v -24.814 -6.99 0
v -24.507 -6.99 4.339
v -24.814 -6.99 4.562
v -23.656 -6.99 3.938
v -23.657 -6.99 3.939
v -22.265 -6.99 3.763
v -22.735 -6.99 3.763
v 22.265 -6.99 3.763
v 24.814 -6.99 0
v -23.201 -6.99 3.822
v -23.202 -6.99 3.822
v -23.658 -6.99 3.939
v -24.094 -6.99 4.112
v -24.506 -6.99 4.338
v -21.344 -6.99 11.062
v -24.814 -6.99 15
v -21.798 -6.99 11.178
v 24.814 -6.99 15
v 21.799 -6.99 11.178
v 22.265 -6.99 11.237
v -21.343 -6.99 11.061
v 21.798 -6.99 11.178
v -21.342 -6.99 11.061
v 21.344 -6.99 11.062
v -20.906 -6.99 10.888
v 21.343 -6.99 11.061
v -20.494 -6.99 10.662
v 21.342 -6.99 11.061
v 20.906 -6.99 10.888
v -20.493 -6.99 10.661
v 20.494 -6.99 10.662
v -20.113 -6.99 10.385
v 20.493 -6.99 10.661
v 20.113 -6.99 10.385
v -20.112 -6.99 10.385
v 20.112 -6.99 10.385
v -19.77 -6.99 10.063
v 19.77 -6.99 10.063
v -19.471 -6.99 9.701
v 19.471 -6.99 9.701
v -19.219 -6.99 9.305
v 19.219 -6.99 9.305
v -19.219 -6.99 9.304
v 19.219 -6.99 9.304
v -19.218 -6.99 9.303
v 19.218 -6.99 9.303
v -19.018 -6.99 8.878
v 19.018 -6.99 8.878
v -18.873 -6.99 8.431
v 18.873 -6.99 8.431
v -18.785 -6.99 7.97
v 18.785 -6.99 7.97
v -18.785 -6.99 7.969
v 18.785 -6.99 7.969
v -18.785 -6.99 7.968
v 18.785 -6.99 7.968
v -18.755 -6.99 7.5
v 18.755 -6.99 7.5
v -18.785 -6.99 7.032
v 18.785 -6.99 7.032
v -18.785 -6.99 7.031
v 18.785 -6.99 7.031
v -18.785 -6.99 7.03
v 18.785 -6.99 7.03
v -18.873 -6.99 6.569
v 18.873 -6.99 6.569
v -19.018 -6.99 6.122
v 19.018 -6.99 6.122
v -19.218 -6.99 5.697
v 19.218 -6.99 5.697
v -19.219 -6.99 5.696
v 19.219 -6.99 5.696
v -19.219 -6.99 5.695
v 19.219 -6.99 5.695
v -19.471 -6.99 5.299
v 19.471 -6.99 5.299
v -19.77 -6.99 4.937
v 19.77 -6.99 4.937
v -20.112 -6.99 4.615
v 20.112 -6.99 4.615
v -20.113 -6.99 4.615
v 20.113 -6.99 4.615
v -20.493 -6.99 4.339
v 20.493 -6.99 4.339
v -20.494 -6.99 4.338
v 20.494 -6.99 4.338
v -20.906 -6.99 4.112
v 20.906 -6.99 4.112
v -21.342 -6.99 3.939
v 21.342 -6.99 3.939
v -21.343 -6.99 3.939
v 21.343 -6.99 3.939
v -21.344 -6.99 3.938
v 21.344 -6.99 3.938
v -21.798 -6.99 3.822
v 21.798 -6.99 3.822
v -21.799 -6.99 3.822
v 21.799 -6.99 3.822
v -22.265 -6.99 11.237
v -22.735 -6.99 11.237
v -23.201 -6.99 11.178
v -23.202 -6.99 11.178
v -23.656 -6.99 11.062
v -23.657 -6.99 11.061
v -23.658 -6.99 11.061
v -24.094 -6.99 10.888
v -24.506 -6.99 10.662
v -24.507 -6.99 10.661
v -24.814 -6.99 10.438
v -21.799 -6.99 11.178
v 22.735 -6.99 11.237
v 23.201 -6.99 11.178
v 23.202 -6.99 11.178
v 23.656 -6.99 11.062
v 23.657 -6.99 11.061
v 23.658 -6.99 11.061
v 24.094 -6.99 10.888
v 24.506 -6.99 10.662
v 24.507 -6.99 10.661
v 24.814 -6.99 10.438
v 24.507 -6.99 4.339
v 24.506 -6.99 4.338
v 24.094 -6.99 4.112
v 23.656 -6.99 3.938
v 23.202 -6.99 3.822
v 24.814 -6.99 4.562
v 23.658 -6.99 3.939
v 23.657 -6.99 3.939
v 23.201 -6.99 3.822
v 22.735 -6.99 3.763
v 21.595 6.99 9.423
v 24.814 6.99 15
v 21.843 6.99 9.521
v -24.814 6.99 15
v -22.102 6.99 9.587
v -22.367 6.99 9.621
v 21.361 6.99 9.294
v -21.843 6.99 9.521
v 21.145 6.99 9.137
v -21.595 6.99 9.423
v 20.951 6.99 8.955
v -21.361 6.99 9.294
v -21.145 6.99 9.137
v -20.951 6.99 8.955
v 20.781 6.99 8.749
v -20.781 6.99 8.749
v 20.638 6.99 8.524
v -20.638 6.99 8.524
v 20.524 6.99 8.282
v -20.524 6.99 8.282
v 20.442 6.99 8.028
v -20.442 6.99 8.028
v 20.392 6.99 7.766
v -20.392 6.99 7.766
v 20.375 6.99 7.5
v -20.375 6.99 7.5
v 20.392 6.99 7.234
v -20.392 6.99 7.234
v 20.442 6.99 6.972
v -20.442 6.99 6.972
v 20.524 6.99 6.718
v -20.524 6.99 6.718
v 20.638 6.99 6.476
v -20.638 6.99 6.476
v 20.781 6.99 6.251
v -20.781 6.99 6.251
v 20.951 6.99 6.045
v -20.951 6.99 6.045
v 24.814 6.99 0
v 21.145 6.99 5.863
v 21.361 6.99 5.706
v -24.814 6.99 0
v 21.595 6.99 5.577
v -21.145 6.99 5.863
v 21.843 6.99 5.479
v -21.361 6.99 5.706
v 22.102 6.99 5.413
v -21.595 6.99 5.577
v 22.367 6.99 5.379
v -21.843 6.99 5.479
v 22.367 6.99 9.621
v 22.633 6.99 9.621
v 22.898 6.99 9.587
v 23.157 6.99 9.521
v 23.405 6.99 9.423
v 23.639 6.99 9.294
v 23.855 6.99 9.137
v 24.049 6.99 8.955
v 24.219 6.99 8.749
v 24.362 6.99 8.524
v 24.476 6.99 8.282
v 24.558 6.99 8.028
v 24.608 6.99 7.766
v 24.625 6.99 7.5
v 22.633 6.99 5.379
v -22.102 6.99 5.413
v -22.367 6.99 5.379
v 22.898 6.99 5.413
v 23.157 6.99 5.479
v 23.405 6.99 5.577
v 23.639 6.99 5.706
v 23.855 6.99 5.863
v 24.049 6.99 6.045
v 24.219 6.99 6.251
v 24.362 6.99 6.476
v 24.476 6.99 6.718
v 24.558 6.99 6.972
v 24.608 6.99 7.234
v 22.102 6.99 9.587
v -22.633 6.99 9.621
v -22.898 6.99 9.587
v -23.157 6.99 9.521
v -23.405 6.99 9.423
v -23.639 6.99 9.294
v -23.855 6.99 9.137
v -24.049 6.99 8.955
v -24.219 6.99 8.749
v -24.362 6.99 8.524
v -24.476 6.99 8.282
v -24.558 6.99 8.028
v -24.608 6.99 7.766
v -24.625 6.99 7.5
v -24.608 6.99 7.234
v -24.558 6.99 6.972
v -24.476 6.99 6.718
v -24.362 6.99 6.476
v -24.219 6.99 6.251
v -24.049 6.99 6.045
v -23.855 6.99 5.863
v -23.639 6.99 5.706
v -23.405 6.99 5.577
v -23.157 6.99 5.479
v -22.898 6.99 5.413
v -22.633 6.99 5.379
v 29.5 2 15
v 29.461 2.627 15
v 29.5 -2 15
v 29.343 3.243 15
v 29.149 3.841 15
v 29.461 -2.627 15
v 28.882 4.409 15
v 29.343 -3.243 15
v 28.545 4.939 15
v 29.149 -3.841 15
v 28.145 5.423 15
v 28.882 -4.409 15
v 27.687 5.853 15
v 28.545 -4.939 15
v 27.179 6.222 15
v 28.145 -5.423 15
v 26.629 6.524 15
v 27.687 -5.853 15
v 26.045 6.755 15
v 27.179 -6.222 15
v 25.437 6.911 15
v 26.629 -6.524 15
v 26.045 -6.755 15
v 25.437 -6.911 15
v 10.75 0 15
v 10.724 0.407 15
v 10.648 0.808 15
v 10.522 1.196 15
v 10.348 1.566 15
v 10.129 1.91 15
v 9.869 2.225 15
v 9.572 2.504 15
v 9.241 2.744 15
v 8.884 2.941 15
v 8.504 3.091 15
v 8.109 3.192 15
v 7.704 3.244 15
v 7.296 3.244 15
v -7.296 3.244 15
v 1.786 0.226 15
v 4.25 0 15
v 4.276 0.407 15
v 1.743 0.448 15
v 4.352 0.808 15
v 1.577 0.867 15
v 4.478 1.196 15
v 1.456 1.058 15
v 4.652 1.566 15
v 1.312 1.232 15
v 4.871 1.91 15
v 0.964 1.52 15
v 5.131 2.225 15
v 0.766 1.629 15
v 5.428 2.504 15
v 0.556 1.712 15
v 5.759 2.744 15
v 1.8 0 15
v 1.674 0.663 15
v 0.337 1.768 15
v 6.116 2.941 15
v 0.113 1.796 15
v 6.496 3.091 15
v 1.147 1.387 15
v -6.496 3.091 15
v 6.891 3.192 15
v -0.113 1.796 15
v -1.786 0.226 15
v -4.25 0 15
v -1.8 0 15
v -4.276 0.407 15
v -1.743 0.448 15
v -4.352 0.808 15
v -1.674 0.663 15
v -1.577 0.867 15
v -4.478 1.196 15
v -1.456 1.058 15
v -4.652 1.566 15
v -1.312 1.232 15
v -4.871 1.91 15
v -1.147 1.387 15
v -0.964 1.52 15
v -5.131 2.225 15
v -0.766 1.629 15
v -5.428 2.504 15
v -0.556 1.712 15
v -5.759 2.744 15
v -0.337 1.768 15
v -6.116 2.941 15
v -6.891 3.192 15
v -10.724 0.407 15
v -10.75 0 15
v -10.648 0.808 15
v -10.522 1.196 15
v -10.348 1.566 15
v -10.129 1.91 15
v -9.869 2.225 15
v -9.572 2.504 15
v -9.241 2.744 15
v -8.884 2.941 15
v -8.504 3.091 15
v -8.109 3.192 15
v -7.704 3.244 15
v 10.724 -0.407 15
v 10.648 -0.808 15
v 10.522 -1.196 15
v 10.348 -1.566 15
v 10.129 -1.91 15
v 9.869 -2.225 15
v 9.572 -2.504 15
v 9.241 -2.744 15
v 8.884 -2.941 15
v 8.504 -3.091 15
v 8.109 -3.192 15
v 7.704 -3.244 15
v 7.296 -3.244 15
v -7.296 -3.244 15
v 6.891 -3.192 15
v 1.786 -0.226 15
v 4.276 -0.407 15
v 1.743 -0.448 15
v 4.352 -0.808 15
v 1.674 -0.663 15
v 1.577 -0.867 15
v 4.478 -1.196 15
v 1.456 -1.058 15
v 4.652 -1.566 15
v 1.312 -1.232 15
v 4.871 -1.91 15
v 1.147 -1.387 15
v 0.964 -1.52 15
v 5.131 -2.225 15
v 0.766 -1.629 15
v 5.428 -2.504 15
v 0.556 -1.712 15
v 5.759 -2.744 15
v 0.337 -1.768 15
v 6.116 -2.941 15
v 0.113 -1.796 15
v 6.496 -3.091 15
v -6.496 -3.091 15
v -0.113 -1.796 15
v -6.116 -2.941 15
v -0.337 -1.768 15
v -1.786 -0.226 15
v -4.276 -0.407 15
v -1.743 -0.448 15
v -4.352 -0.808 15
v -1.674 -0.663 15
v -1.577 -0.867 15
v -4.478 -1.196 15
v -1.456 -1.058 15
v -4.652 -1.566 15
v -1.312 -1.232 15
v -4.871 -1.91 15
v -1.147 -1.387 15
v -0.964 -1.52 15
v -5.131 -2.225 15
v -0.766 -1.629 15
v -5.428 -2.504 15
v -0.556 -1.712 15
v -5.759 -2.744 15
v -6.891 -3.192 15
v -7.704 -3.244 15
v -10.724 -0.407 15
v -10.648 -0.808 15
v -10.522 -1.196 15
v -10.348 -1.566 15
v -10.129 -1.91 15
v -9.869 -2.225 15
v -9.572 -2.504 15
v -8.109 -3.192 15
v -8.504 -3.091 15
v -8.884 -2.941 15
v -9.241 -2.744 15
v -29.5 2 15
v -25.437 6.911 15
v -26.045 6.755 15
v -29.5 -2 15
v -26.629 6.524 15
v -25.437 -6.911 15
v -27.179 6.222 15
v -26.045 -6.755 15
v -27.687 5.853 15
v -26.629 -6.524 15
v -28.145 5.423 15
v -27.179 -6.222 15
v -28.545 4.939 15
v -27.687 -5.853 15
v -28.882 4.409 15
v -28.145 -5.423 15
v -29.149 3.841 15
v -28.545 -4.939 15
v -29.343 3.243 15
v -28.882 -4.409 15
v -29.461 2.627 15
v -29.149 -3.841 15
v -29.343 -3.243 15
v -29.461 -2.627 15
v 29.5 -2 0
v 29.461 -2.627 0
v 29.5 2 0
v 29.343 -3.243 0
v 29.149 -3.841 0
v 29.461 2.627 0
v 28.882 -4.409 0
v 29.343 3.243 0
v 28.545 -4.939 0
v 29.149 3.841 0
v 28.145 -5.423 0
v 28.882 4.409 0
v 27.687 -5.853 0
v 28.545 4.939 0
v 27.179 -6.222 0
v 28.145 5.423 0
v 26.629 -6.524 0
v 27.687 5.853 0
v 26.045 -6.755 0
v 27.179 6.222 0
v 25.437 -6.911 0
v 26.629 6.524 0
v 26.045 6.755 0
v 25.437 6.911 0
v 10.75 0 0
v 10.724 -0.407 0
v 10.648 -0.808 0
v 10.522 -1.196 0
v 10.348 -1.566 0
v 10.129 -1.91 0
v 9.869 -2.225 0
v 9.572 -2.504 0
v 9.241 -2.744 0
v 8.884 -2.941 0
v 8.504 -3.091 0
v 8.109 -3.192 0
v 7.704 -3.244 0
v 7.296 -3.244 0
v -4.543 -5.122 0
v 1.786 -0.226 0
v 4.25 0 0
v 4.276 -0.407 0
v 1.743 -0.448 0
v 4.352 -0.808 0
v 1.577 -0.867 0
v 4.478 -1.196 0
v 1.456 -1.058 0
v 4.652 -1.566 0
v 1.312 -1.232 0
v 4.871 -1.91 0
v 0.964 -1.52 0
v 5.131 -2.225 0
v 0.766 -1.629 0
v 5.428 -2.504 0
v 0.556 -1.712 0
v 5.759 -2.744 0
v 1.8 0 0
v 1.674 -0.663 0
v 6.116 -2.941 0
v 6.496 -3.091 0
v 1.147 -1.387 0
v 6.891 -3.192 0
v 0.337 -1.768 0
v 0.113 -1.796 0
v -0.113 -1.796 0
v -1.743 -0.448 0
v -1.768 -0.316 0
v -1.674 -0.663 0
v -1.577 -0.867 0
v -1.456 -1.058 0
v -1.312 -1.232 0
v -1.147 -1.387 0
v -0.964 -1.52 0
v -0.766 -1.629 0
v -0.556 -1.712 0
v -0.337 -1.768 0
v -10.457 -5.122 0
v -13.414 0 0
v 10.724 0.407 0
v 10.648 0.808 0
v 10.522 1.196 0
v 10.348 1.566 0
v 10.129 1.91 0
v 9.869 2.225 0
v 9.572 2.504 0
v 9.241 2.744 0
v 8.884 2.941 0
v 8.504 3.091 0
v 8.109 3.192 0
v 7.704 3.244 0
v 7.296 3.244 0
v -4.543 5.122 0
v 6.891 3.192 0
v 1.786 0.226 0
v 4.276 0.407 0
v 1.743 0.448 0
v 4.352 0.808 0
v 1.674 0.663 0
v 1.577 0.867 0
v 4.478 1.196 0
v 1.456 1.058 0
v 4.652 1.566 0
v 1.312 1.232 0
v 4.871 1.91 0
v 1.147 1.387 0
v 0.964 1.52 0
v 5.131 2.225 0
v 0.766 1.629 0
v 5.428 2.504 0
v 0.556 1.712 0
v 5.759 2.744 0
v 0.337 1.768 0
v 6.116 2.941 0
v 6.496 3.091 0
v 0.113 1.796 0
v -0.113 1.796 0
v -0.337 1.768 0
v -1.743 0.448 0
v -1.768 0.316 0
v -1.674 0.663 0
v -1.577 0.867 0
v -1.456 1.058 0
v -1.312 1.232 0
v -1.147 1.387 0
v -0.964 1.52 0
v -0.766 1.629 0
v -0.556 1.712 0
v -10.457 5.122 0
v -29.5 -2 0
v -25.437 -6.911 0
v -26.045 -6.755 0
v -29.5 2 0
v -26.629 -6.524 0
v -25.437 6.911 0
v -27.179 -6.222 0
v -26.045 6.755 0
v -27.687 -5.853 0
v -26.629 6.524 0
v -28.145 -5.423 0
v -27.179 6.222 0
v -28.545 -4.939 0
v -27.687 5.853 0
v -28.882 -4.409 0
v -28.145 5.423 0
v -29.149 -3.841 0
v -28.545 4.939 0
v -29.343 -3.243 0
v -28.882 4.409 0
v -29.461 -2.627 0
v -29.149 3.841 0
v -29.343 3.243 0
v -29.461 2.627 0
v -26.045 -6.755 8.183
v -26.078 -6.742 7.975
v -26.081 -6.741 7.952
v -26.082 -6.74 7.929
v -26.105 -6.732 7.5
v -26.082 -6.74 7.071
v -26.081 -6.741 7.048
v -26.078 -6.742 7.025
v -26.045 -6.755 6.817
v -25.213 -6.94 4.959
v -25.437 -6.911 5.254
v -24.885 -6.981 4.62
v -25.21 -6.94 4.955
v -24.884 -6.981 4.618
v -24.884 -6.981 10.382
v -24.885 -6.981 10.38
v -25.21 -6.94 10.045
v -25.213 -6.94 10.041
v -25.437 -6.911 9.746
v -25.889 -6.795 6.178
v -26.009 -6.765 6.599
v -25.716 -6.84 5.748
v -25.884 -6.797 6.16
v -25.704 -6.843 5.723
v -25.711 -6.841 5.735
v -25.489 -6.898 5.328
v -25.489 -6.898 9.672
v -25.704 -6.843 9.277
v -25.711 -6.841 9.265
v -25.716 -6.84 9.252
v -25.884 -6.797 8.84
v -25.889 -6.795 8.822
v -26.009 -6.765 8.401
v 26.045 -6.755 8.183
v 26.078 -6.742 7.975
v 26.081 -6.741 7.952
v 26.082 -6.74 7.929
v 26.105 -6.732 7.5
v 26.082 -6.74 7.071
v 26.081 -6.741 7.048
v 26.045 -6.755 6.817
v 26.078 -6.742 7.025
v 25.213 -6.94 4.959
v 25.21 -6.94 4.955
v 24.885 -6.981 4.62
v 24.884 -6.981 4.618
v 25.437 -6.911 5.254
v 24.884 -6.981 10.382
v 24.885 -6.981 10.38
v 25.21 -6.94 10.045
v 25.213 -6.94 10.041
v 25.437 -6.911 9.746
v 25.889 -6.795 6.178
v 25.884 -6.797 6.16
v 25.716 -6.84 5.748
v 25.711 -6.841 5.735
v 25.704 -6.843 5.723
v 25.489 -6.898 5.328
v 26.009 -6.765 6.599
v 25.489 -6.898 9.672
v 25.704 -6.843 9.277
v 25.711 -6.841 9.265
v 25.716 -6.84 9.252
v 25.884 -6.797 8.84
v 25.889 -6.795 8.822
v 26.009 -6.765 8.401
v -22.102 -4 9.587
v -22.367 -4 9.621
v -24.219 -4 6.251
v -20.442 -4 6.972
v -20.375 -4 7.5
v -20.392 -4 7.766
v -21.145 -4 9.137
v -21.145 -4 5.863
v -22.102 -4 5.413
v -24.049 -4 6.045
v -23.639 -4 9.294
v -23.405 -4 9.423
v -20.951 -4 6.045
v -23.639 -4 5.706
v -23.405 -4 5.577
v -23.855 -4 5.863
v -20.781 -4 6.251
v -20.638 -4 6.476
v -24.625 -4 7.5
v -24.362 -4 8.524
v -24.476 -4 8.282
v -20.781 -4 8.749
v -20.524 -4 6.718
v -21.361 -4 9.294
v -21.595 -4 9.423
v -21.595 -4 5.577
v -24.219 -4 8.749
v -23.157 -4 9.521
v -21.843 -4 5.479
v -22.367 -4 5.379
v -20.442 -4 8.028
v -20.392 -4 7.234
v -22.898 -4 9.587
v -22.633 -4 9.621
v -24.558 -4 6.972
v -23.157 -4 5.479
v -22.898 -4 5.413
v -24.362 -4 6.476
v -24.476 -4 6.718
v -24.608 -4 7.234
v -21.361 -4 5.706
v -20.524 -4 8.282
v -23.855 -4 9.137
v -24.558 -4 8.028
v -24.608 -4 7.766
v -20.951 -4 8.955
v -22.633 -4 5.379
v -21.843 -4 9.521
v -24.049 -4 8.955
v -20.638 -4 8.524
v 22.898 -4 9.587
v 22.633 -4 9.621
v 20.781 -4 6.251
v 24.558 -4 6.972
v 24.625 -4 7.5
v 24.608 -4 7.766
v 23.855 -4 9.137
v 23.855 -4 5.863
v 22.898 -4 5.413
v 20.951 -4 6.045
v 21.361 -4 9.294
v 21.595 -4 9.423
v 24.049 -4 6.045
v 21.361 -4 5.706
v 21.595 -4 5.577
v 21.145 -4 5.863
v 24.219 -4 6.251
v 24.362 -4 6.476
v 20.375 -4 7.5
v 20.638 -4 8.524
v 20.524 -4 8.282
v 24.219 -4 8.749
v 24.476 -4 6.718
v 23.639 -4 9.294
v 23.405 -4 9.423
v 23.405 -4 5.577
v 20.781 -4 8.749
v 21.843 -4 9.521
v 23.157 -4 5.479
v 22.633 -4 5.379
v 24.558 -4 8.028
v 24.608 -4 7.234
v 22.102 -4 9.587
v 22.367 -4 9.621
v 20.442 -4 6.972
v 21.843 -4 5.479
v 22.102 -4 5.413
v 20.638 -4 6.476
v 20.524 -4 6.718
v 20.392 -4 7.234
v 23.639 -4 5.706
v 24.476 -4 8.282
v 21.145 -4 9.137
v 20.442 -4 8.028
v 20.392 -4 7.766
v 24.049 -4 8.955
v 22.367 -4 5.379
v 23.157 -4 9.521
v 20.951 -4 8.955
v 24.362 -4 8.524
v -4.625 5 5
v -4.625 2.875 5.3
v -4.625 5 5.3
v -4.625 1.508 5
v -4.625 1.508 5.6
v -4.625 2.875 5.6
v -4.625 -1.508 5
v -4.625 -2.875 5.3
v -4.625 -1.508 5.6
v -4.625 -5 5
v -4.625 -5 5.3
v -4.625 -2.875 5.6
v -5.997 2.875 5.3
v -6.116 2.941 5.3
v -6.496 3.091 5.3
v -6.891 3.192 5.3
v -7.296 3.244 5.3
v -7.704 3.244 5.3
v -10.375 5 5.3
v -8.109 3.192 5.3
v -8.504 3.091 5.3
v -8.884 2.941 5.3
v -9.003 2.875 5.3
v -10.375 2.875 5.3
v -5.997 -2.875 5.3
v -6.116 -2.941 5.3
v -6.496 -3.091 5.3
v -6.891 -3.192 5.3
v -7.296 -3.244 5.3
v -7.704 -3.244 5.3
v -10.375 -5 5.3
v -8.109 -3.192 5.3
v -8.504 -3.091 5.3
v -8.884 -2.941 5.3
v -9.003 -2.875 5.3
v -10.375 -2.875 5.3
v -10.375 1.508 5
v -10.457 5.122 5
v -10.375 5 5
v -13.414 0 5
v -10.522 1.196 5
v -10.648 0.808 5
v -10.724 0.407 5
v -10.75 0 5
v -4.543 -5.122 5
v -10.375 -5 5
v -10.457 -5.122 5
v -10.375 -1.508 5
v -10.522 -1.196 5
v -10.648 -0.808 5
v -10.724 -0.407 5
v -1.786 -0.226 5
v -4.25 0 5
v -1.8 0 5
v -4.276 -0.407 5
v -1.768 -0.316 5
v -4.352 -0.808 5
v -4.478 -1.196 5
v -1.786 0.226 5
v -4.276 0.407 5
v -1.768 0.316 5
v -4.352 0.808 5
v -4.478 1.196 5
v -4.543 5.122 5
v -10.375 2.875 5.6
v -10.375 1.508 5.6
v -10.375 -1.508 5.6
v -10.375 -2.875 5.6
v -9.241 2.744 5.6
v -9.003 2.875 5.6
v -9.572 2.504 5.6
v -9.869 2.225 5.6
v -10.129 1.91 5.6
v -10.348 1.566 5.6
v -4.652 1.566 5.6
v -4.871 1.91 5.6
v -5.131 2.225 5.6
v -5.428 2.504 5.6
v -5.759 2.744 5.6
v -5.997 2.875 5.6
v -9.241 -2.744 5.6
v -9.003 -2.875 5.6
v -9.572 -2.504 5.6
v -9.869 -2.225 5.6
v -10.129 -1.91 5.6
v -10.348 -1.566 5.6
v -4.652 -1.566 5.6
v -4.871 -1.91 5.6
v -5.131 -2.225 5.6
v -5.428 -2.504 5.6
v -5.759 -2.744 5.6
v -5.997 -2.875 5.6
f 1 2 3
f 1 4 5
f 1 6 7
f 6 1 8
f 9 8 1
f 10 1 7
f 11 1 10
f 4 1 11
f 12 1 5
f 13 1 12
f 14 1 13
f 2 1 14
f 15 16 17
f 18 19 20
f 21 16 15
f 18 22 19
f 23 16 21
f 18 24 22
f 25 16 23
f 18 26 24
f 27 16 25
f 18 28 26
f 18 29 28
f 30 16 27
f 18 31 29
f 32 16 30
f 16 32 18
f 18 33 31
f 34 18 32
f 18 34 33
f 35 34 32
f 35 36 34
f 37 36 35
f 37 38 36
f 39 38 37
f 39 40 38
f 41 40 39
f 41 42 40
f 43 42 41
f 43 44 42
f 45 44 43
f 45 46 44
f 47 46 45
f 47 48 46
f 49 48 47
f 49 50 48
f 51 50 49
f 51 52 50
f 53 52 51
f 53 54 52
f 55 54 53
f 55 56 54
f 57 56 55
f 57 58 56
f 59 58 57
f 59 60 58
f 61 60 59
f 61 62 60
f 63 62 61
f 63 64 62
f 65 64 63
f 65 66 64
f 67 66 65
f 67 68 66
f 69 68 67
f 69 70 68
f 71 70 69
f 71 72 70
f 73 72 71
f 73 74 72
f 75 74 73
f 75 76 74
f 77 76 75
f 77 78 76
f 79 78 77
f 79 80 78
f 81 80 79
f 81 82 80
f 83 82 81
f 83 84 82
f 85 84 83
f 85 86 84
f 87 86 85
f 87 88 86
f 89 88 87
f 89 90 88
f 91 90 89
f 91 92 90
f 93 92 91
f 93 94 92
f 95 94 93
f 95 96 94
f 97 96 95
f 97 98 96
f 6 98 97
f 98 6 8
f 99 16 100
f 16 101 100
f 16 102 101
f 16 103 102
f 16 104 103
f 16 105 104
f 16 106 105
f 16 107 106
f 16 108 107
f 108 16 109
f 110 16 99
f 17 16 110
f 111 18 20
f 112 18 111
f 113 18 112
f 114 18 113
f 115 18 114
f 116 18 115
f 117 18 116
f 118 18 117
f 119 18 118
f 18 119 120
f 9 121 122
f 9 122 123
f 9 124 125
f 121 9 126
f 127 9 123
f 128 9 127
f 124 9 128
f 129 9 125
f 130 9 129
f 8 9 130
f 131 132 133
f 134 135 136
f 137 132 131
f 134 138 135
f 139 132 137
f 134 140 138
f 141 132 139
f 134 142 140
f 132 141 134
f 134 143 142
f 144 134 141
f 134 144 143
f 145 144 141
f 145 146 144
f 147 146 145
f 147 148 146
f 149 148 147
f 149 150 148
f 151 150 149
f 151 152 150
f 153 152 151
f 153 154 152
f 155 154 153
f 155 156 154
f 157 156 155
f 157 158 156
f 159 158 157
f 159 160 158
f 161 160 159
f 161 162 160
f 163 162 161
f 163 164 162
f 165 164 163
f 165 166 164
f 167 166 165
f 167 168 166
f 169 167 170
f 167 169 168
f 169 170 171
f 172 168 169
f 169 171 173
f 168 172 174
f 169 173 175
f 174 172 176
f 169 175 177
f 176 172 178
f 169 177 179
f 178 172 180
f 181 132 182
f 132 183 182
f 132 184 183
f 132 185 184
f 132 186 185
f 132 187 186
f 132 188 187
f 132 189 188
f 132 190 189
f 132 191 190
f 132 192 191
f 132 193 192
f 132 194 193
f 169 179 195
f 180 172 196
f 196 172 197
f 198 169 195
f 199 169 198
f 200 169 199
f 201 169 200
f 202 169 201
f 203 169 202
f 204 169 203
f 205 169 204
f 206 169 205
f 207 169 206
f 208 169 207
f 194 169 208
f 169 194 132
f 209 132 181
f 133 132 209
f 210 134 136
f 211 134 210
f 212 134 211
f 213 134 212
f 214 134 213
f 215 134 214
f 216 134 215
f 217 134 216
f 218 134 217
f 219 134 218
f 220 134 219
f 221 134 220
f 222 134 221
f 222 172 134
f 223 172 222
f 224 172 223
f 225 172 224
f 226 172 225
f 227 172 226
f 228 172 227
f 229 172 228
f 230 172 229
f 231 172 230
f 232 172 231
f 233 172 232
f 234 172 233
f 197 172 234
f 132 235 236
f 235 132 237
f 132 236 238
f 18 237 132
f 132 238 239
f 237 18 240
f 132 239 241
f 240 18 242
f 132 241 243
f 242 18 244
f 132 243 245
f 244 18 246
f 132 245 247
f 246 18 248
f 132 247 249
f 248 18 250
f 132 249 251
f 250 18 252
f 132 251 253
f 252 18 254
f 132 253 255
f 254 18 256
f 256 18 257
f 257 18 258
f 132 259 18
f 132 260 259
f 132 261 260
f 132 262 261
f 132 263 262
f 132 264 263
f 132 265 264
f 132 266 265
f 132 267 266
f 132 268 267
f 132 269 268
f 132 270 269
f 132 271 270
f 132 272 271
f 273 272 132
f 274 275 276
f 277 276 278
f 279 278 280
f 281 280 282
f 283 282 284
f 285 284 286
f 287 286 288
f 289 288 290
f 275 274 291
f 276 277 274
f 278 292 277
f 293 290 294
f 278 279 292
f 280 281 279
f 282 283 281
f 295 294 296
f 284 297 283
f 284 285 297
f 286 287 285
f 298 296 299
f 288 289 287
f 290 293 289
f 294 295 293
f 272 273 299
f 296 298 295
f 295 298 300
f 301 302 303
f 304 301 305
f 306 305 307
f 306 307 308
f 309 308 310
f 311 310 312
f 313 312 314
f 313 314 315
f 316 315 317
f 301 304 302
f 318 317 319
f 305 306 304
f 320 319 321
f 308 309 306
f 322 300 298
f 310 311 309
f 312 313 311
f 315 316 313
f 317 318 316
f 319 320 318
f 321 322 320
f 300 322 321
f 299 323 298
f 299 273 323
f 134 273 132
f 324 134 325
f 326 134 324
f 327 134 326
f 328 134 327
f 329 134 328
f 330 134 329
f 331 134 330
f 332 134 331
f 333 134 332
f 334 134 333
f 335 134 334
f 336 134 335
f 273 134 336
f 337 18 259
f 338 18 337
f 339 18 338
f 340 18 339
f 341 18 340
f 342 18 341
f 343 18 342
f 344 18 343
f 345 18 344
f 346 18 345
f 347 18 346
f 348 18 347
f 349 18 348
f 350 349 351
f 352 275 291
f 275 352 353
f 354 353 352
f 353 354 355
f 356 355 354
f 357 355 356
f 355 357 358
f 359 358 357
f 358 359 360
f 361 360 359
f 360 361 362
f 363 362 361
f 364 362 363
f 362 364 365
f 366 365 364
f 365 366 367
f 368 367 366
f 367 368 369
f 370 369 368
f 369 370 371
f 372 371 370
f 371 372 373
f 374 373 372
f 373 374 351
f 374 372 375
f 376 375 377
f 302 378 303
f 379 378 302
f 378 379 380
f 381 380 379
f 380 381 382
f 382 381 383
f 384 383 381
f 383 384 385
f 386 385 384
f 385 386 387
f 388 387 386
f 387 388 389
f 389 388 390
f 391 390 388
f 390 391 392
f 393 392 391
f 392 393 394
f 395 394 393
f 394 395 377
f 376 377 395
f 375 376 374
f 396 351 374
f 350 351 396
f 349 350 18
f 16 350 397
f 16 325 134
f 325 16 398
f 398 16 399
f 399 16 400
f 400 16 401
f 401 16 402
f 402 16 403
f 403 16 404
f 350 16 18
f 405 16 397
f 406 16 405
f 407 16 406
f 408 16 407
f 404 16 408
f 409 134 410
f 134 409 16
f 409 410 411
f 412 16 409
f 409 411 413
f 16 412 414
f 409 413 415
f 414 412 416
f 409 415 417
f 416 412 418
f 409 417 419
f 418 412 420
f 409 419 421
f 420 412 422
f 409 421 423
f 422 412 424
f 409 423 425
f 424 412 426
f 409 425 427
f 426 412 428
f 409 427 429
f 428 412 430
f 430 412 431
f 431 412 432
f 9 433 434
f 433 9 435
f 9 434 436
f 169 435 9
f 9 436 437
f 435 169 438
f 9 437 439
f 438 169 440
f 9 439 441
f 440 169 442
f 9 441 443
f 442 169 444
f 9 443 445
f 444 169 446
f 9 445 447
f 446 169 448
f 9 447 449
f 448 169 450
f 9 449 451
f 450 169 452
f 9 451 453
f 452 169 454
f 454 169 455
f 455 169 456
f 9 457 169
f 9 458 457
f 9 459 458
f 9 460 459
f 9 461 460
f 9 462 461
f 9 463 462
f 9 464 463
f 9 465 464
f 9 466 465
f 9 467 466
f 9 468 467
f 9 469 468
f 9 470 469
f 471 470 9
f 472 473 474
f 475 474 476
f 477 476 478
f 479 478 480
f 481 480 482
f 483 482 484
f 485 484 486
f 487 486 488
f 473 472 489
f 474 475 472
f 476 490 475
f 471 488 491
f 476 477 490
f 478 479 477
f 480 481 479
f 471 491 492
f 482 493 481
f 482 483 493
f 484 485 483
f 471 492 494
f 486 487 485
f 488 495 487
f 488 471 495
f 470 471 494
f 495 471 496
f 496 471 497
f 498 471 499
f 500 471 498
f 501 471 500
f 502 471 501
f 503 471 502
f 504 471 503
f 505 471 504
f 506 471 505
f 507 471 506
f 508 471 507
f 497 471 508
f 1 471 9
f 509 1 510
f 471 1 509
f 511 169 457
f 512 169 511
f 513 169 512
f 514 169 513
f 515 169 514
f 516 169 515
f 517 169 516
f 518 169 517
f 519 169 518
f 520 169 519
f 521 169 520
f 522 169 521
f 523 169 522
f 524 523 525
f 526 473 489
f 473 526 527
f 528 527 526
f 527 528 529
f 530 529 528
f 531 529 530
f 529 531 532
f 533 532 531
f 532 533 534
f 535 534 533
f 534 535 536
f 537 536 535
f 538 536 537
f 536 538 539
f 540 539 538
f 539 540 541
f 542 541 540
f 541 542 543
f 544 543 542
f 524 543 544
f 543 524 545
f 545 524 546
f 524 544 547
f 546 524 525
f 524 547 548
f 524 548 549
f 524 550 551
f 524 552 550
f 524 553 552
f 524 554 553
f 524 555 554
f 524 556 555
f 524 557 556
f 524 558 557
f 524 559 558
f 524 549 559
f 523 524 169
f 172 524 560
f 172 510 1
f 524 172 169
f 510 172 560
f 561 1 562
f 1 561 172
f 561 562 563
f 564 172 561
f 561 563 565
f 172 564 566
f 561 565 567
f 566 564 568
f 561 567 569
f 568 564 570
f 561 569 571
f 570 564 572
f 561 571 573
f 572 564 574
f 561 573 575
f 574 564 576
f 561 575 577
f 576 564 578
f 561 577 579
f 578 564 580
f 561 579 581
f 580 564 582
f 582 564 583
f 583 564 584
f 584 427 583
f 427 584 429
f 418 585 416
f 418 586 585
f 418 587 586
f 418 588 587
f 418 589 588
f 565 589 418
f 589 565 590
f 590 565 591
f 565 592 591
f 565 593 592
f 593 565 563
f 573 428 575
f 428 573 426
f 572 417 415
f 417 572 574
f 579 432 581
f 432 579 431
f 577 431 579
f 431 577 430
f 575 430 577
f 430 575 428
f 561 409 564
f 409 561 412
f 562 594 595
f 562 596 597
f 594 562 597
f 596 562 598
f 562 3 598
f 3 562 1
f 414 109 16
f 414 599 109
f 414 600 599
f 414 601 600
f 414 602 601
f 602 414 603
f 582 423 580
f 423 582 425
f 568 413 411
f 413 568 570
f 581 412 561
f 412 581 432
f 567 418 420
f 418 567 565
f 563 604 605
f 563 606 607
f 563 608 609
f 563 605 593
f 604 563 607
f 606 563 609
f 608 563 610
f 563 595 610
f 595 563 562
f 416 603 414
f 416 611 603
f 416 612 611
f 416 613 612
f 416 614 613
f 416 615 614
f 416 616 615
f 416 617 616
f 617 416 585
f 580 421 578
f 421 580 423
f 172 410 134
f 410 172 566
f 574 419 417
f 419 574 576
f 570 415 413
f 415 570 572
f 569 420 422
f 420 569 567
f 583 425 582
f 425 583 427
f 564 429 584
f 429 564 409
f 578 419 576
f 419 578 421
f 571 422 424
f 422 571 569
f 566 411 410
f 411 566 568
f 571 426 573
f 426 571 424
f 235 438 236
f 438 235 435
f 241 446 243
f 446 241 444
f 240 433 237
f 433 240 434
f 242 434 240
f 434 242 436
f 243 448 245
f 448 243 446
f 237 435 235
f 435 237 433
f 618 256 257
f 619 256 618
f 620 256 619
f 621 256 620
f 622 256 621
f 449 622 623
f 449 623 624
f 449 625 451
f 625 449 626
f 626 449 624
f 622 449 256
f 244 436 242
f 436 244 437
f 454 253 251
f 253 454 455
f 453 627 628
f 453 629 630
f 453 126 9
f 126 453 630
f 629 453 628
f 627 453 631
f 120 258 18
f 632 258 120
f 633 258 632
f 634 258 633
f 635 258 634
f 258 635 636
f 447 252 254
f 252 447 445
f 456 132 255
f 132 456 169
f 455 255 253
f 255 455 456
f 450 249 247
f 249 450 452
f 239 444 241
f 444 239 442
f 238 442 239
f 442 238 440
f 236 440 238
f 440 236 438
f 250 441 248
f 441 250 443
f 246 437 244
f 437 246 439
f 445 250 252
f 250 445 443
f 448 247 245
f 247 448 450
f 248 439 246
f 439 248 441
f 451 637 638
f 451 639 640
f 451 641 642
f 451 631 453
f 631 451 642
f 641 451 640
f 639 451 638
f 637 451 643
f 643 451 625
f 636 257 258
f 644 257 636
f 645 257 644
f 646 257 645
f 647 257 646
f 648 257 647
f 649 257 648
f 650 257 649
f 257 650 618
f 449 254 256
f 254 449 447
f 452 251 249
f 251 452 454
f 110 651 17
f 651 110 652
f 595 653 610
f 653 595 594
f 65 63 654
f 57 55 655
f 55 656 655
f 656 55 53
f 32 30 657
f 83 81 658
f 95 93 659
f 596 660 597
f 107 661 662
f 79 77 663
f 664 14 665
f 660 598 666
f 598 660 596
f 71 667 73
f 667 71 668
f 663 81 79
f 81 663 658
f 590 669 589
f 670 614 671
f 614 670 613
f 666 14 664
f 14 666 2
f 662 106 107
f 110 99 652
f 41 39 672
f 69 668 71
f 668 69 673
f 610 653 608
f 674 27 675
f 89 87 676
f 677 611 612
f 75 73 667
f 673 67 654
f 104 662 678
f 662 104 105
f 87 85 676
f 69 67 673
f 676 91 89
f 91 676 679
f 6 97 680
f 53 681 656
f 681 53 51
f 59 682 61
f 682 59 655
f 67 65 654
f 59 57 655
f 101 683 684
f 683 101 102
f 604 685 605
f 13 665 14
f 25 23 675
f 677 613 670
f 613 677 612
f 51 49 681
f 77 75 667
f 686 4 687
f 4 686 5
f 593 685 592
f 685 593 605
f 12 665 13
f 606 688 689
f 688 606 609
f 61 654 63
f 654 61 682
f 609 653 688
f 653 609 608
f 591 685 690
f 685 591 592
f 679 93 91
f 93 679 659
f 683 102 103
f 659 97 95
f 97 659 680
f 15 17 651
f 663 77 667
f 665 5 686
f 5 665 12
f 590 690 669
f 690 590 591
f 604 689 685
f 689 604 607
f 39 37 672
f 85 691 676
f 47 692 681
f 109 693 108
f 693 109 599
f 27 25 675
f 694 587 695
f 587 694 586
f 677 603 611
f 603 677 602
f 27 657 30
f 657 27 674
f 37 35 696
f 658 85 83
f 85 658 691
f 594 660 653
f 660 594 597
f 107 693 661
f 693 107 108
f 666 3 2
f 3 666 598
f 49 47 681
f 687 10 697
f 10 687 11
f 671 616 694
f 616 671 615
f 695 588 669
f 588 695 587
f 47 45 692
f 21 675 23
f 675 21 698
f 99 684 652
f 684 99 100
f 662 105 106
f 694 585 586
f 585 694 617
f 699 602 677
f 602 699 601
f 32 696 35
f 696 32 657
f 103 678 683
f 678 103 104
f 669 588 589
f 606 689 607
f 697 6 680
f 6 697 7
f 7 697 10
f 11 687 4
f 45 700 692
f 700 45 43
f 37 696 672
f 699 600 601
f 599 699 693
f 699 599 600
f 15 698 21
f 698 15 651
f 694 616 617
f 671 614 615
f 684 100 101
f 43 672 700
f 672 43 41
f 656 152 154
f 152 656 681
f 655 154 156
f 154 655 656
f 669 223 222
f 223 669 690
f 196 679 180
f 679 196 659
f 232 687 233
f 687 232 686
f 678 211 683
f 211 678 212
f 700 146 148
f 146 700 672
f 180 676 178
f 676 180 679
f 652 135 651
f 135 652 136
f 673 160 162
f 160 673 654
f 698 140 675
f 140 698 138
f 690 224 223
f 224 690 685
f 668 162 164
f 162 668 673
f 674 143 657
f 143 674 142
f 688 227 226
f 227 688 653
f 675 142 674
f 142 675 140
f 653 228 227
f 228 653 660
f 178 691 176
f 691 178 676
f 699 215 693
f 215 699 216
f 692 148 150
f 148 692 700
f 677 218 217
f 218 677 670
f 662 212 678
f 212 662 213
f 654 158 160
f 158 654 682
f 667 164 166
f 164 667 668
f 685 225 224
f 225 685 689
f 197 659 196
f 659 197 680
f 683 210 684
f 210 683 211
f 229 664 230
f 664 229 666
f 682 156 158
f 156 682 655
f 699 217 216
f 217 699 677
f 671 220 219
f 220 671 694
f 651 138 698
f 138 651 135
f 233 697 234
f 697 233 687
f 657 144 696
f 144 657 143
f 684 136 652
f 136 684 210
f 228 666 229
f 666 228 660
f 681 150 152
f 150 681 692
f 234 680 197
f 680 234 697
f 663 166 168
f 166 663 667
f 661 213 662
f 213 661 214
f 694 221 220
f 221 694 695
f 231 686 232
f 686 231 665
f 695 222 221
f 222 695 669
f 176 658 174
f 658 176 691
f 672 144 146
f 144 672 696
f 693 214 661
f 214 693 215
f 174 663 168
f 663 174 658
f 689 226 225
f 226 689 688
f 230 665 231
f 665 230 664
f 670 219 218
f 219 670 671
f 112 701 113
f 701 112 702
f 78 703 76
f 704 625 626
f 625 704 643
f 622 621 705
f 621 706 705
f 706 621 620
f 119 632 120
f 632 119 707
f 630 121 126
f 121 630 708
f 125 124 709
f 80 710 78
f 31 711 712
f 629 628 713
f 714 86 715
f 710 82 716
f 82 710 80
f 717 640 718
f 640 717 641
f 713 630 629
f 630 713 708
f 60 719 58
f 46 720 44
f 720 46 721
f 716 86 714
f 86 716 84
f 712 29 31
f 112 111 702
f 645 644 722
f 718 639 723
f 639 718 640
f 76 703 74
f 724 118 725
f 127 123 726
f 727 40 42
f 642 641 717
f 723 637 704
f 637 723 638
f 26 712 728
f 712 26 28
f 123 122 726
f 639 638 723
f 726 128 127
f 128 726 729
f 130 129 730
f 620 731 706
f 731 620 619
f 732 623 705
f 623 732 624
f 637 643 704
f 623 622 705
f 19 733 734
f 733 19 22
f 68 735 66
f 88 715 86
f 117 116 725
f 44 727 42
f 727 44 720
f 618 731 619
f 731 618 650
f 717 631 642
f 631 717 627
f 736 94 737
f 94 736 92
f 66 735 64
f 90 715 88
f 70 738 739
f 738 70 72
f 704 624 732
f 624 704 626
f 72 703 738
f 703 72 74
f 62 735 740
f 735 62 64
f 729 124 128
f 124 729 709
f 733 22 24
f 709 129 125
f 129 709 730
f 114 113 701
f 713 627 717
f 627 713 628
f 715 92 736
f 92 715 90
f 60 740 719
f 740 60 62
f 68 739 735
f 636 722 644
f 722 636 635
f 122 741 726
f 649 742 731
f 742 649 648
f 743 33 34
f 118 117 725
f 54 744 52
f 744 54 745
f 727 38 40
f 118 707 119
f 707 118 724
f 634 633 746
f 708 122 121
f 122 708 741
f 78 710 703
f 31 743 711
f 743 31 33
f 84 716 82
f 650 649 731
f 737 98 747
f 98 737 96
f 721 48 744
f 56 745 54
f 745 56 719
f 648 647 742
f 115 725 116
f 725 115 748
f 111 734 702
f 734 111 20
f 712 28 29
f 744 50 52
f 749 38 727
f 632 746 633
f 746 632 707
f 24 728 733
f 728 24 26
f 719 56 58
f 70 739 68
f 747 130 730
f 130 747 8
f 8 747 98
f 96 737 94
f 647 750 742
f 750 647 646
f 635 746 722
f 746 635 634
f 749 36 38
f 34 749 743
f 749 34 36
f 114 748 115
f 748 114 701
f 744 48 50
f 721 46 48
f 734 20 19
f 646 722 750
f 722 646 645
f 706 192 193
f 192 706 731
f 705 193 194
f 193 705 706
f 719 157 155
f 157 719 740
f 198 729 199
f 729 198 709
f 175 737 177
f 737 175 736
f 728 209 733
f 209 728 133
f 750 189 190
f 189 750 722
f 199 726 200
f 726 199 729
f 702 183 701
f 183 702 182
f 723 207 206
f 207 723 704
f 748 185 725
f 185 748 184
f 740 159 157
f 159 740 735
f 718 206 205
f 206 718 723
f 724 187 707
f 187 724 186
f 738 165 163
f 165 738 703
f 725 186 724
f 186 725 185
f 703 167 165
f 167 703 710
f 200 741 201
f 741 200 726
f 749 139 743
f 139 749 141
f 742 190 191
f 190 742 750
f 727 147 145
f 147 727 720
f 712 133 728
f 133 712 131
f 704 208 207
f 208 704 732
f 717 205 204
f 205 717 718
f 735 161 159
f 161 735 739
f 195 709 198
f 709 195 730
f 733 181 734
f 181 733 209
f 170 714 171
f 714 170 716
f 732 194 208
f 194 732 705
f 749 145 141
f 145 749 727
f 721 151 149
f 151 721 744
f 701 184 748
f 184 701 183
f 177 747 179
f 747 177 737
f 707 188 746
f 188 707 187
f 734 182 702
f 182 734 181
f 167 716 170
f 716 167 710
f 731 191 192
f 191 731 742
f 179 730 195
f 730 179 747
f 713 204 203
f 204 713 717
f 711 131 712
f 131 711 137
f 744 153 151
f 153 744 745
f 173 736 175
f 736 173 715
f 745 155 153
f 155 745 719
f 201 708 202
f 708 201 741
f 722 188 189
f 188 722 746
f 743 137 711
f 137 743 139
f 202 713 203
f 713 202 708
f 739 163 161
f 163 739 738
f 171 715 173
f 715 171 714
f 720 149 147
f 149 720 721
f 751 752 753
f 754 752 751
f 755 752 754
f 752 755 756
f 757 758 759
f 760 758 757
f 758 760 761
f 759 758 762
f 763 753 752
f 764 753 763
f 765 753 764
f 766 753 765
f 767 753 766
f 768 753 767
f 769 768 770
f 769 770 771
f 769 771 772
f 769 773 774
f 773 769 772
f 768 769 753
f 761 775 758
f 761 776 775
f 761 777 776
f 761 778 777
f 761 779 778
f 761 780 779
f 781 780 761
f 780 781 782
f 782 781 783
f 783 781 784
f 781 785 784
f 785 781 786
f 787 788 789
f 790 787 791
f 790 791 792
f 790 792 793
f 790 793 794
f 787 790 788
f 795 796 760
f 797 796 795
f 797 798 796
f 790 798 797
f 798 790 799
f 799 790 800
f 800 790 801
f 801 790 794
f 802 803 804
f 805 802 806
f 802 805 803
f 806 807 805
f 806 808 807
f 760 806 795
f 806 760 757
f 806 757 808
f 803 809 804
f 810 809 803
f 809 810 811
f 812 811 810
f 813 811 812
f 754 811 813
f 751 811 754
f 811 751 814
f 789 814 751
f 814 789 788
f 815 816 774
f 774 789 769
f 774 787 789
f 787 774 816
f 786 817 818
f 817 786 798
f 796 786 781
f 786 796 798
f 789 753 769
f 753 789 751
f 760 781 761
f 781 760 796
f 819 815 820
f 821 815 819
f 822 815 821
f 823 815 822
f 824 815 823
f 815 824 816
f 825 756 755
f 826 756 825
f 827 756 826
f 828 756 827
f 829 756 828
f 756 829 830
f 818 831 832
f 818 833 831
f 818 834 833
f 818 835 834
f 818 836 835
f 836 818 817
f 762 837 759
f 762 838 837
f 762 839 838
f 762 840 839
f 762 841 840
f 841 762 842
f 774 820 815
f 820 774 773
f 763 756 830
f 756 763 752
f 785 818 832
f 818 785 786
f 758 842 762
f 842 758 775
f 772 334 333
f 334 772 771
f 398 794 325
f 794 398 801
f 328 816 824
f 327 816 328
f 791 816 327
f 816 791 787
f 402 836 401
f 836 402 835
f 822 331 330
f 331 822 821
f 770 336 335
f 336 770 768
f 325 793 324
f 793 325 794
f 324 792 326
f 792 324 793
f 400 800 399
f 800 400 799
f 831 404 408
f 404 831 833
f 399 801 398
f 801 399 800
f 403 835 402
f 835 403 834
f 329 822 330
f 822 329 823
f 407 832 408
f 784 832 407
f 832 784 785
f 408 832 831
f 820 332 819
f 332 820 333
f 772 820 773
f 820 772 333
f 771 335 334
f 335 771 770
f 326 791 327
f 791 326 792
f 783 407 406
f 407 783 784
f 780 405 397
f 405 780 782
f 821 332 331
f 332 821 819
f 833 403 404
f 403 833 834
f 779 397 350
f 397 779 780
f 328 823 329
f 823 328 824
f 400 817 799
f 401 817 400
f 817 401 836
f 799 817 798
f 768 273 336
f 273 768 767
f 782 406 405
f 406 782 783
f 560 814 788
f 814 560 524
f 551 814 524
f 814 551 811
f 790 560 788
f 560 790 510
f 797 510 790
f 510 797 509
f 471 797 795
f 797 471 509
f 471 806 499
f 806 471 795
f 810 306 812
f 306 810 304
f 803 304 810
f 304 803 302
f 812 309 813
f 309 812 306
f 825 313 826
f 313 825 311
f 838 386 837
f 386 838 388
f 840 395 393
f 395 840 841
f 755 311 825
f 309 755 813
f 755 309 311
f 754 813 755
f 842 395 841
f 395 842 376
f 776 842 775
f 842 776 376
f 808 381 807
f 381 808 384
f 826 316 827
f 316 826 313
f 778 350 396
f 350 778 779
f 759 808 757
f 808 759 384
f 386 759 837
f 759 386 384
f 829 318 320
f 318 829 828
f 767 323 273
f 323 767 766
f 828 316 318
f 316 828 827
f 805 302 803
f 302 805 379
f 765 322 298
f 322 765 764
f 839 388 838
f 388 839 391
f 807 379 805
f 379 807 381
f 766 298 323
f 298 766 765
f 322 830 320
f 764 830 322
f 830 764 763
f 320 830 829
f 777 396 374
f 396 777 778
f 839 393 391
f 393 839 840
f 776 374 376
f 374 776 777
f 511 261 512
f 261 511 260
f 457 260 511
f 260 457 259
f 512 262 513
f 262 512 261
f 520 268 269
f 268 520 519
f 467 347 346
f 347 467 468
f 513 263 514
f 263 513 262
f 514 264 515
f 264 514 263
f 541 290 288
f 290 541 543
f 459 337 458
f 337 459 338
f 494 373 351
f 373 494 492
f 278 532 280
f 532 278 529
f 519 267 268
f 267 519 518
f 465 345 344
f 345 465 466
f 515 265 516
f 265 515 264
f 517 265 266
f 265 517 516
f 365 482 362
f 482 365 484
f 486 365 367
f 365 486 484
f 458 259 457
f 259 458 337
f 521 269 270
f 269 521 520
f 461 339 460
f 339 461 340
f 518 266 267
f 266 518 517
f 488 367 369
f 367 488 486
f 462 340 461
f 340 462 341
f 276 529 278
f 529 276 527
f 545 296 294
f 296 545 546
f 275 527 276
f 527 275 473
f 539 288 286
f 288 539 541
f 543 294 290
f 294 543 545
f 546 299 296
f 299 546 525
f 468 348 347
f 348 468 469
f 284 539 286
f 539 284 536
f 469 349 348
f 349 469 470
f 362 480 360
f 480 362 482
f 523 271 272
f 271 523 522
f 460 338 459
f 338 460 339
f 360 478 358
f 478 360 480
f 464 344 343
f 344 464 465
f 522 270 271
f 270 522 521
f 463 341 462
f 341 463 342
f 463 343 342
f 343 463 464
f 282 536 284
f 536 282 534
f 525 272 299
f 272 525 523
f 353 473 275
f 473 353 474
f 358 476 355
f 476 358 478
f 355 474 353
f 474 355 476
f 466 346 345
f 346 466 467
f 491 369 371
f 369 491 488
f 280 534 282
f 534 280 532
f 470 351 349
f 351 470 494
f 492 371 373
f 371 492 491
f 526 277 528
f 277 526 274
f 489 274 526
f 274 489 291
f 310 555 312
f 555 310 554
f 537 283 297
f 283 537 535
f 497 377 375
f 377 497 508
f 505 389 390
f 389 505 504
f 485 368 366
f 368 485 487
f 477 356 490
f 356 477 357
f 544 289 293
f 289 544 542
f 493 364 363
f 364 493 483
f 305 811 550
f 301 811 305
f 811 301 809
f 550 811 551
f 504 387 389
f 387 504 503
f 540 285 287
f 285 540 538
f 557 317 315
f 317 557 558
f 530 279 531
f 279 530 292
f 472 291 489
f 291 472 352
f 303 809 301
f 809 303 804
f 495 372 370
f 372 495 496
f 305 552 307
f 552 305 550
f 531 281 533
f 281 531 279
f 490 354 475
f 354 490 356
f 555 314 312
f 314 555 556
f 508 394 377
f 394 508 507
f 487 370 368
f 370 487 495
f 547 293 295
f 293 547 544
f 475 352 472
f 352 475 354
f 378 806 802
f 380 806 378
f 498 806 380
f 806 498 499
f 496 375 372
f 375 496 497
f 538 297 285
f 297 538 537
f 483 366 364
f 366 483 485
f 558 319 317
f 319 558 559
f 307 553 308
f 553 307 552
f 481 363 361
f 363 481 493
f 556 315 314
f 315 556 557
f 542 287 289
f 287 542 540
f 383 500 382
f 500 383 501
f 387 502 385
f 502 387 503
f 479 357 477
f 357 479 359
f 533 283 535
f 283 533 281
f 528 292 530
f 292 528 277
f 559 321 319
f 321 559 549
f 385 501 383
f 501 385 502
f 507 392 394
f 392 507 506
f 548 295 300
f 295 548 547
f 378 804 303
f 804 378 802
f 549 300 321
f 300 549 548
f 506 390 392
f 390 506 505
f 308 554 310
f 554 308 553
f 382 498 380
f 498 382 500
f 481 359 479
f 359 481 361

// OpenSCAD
$fn = 50;


difference() {
	union() {
		hull() {
			translate(v = [-9.5000000000, 2.0000000000, 0]) {
				cylinder(h = 15, r = 5);
			}
			translate(v = [9.5000000000, 2.0000000000, 0]) {
				cylinder(h = 15, r = 5);
			}
			translate(v = [-9.5000000000, -2.0000000000, 0]) {
				cylinder(h = 15, r = 5);
			}
			translate(v = [9.5000000000, -2.0000000000, 0]) {
				cylinder(h = 15, r = 5);
			}
		}
		translate(v = [-15.0000000000, 0.0000000000, 0]) {
			hull() {
				translate(v = [-9.5000000000, 2.0000000000, 0]) {
					cylinder(h = 15, r = 5);
				}
				translate(v = [9.5000000000, 2.0000000000, 0]) {
					cylinder(h = 15, r = 5);
				}
				translate(v = [-9.5000000000, -2.0000000000, 0]) {
					cylinder(h = 15, r = 5);
				}
				translate(v = [9.5000000000, -2.0000000000, 0]) {
					cylinder(h = 15, r = 5);
				}
			}
		}
		translate(v = [-15.0000000000, 0.0000000000, 0]) {
			hull() {
				translate(v = [-9.5000000000, 2.0000000000, 0]) {
					cylinder(h = 15, r = 5);
				}
				translate(v = [9.5000000000, 2.0000000000, 0]) {
					cylinder(h = 15, r = 5);
				}
				translate(v = [-9.5000000000, -2.0000000000, 0]) {
					cylinder(h = 15, r = 5);
				}
				translate(v = [9.5000000000, -2.0000000000, 0]) {
					cylinder(h = 15, r = 5);
				}
			}
		}
		translate(v = [15.0000000000, 0.0000000000, 0]) {
			hull() {
				translate(v = [-9.5000000000, 2.0000000000, 0]) {
					cylinder(h = 15, r = 5);
				}
				translate(v = [9.5000000000, 2.0000000000, 0]) {
					cylinder(h = 15, r = 5);
				}
				translate(v = [-9.5000000000, -2.0000000000, 0]) {
					cylinder(h = 15, r = 5);
				}
				translate(v = [9.5000000000, -2.0000000000, 0]) {
					cylinder(h = 15, r = 5);
				}
			}
		}
		translate(v = [15.0000000000, 0.0000000000, 0]) {
			hull() {
				translate(v = [-9.5000000000, 2.0000000000, 0]) {
					cylinder(h = 15, r = 5);
				}
				translate(v = [9.5000000000, 2.0000000000, 0]) {
					cylinder(h = 15, r = 5);
				}
				translate(v = [-9.5000000000, -2.0000000000, 0]) {
					cylinder(h = 15, r = 5);
				}
				translate(v = [9.5000000000, -2.0000000000, 0]) {
					cylinder(h = 15, r = 5);
				}
			}
		}
	}
	union() {
		translate(v = [-22.5000000000, -7.0000000000, 7.5000000000]) {
			rotate(a = [90, 0, 0]) {
				difference() {
					union() {
						#translate(v = [0, 0, -14.0000000000]) {
							cylinder(h = 14, r = 2.0000000000);
						}
						#translate(v = [0, 0, -3]) {
							cylinder(h = 3, r1 = 2.1250000000, r2 = 3.7500000000);
						}
						#translate(v = [0, 0, -14.0000000000]) {
							cylinder(h = 14, r = 2.1250000000);
						}
						#translate(v = [0, 0, -14.0000000000]) {
							cylinder(h = 14, r = 2.0000000000);
						}
					}
					union();
				}
			}
		}
		translate(v = [22.5000000000, -7.0000000000, 7.5000000000]) {
			rotate(a = [90, 0, 0]) {
				difference() {
					union() {
						#translate(v = [0, 0, -14.0000000000]) {
							cylinder(h = 14, r = 2.0000000000);
						}
						#translate(v = [0, 0, -3]) {
							cylinder(h = 3, r1 = 2.1250000000, r2 = 3.7500000000);
						}
						#translate(v = [0, 0, -14.0000000000]) {
							cylinder(h = 14, r = 2.1250000000);
						}
						#translate(v = [0, 0, -14.0000000000]) {
							cylinder(h = 14, r = 2.0000000000);
						}
					}
					union();
				}
			}
		}
		translate(v = [-7.5000000000, 0.0000000000, 0]) {
			rotate(a = [0, 0, 0]) {
				difference() {
					union() {
						#translate(v = [-2.8750000000, -5.0000000000, -0.3000000000]) {
							cube(size = [5.7500000000, 10, 0.3000000000]);
						}
						#translate(v = [-2.8750000000, -2.8750000000, -0.6000000000]) {
							cube(size = [5.7500000000, 5.7500000000, 0.3000000000]);
						}
						#translate(v = [-2.8750000000, -5.0000000000, 5]) {
							cube(size = [5.7500000000, 10, 0.3000000000]);
						}
						#translate(v = [-2.8750000000, -2.8750000000, 5.3000000000]) {
							cube(size = [5.7500000000, 5.7500000000, 0.3000000000]);
						}
						#translate(v = [0, 0, -100.0000000000]) {
							cylinder(h = 200, r = 3.2500000000);
						}
						#linear_extrude(height = 5) {
							polygon(points = [[5.9142500000, 0.0000000000], [2.9571250000, 5.1218907443], [-2.9571250000, 5.1218907443], [-5.9142500000, 0.0000000000], [-2.9571250000, -5.1218907443], [2.9571250000, -5.1218907443]]);
						}
						#translate(v = [-2.8750000000, -5.0000000000, -0.3000000000]) {
							cube(size = [5.7500000000, 10, 0.3000000000]);
						}
						#translate(v = [-2.8750000000, -2.8750000000, -0.6000000000]) {
							cube(size = [5.7500000000, 5.7500000000, 0.3000000000]);
						}
						#translate(v = [-2.8750000000, -5.0000000000, 5]) {
							cube(size = [5.7500000000, 10, 0.3000000000]);
						}
						#translate(v = [-2.8750000000, -2.8750000000, 5.3000000000]) {
							cube(size = [5.7500000000, 5.7500000000, 0.3000000000]);
						}
						#translate(v = [0, 0, -100.0000000000]) {
							cylinder(h = 200, r = 3.2500000000);
						}
						#translate(v = [-2.8750000000, -5.0000000000, -0.3000000000]) {
							cube(size = [5.7500000000, 10, 0.3000000000]);
						}
						#translate(v = [-2.8750000000, -2.8750000000, -0.6000000000]) {
							cube(size = [5.7500000000, 5.7500000000, 0.3000000000]);
						}
						#translate(v = [-2.8750000000, -5.0000000000, 5]) {
							cube(size = [5.7500000000, 10, 0.3000000000]);
						}
						#translate(v = [-2.8750000000, -2.8750000000, 5.3000000000]) {
							cube(size = [5.7500000000, 5.7500000000, 0.3000000000]);
						}
						#translate(v = [0, 0, -100.0000000000]) {
							cylinder(h = 200, r = 3.2500000000);
						}
					}
					union();
				}
			}
		}
		translate(v = [-7.5000000000, 0.0000000000, 0]) {
			translate(v = [0, 0, -100]) {
				cylinder(h = 200, r = 3.2500000000);
			}
		}
		translate(v = [7.5000000000, 0.0000000000, 0]) {
			translate(v = [0, 0, -100]) {
				cylinder(h = 200, r = 3.2500000000);
			}
		}
		translate(v = [-7.5000000000, 0.0000000000, 0]) {
			translate(v = [0, 0, -100]) {
				cylinder(h = 200, r = 1.8000000000);
			}
		}
		translate(v = [0, 0, -100]) {
			cylinder(h = 200, r = 1.8000000000);
		}
		translate(v = [7.5000000000, 0.0000000000, 0]) {
			translate(v = [0, 0, -100]) {
				cylinder(h = 200, r = 1.8000000000);
			}
		}
	}
}
